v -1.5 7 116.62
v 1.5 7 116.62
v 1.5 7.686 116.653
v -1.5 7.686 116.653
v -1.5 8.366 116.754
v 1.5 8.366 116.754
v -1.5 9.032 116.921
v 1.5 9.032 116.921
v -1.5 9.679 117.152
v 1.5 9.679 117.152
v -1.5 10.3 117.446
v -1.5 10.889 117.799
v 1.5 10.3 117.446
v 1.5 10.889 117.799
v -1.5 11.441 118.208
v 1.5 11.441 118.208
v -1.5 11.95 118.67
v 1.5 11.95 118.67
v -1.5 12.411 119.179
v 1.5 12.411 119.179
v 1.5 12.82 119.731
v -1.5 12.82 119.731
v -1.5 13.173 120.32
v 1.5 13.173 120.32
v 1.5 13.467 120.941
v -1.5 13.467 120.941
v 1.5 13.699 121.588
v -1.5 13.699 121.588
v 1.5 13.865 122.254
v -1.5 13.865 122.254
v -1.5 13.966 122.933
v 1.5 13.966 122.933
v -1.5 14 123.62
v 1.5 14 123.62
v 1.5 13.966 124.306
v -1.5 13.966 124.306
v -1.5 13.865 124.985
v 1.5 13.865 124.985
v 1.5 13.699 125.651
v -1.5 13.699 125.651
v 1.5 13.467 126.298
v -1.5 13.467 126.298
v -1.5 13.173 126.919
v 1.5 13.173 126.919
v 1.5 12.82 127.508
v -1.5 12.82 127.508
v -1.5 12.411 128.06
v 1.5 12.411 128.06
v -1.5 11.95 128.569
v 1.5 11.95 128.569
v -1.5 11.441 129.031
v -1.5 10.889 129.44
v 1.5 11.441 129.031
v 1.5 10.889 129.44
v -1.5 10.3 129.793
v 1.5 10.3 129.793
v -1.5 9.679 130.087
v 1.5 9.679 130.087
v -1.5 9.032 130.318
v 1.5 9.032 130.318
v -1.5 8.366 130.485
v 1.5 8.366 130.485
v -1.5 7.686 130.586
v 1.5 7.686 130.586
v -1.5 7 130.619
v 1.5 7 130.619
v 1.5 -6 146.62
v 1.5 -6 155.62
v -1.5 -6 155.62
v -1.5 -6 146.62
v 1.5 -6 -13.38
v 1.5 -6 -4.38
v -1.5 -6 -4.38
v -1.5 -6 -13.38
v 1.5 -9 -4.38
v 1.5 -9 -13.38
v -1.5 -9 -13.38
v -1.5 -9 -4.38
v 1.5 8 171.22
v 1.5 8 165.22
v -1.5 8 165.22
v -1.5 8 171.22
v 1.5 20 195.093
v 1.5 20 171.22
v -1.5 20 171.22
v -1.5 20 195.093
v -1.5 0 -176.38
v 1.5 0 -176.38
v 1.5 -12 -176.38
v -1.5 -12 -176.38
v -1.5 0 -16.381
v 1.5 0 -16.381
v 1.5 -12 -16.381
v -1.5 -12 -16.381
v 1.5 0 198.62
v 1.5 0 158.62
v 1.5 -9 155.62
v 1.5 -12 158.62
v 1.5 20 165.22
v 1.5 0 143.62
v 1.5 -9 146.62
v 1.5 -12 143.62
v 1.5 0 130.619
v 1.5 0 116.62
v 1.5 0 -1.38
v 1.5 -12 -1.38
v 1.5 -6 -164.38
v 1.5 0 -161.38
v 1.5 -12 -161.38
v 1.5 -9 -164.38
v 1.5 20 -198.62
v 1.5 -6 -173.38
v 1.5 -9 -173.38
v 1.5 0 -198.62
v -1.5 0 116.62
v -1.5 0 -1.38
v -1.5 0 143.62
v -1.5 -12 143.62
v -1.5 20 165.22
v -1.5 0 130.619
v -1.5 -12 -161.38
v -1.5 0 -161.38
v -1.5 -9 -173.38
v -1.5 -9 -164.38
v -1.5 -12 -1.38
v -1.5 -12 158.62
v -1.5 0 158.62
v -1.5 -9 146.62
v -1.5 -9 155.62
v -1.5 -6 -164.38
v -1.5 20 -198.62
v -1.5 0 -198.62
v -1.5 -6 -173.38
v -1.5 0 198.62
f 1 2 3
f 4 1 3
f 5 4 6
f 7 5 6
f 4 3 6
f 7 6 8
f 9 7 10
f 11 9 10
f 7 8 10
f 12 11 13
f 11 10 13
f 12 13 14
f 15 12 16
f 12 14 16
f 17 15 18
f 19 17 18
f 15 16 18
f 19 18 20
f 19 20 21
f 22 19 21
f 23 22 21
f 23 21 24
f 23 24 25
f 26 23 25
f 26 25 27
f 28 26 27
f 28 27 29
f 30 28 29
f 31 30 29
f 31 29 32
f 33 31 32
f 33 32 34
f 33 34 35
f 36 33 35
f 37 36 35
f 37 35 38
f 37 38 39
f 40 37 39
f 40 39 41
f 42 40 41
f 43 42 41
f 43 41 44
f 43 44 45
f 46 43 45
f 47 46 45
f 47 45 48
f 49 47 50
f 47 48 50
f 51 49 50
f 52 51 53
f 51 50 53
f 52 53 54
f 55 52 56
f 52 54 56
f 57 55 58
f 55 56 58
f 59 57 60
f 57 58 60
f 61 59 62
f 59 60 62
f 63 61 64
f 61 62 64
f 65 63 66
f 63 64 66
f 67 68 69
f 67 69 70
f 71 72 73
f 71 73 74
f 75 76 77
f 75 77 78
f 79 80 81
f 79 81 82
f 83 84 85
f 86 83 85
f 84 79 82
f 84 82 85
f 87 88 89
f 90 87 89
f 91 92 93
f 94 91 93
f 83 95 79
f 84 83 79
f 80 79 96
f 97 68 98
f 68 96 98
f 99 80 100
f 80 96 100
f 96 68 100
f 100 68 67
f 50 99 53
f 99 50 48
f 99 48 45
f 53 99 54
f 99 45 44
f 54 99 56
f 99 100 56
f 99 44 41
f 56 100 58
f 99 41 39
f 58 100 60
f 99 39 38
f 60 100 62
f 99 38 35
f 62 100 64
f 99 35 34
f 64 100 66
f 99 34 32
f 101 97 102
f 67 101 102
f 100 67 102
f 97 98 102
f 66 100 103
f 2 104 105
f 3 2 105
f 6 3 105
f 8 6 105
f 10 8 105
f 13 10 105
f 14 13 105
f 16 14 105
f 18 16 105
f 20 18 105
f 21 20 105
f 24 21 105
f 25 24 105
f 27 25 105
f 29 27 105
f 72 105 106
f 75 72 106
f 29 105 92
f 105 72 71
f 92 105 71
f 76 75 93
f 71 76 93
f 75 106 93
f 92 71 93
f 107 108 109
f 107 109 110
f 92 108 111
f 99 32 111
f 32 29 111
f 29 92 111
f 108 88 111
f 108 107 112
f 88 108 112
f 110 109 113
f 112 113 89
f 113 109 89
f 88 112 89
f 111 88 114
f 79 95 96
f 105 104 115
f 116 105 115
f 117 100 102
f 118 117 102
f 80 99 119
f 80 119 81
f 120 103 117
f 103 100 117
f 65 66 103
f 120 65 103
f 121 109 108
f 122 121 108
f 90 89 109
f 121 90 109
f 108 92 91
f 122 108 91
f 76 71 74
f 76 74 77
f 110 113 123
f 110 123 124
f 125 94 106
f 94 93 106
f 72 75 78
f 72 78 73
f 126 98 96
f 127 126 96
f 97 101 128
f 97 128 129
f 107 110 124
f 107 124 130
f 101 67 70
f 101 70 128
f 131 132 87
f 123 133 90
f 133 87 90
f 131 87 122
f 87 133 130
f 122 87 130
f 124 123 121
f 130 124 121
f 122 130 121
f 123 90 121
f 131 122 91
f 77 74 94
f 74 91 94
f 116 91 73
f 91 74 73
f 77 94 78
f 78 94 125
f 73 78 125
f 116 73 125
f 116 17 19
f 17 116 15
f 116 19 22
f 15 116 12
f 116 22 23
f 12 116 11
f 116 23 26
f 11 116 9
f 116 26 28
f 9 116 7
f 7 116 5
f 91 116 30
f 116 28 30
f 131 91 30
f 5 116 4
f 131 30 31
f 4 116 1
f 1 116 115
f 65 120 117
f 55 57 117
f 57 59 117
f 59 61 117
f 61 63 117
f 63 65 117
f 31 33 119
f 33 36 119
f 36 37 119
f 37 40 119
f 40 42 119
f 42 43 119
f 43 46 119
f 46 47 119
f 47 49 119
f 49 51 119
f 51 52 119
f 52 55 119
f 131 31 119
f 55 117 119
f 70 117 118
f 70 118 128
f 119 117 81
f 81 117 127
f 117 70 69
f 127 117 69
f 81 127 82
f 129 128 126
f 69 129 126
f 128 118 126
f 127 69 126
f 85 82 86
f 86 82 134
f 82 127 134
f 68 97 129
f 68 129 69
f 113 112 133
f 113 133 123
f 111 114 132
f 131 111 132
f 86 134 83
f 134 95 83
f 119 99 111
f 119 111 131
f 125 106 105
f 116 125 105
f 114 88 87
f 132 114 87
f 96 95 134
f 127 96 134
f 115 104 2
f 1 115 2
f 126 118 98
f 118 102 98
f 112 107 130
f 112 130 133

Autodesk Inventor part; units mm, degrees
ref_plane "YZ Plane" through (0, 0, 0) normal (1, 0, 0) x (0, 1, 0)
ref_plane "XZ Plane" through (0, 0, 0) normal (0, 1, 0) x (-1, 0, 0)
ref_plane "XY Plane" through (0, 0, 0) normal (0, 0, 1) x (1, 0, 0)
sketch "Sketch2" plane through (0, 0, 0) normal (0, 1, 0) x (-1, 0, 0)
  line L0 (-1.5, -198.6195) -> (1.5, -198.6195)
  line L1 (1.5, -198.6195) -> (1.5, 198.6195)
  line L2 (1.5, 198.6195) -> (-1.5, 198.6195)
  line L3 (-1.5, 198.6195) -> (-1.5, -198.6195)
  line L4 (-1.5, -198.6195) -> (1.5, 198.6195) construction
  line L5 (1.5, -198.6195) -> (-1.5, 198.6195) construction
  point P0 (0, 0)
  dimension "d0" = 3
  dimension "d1" = 397.239
extrude "Extrusion1" add sketch "Sketch2" along normal blind 20
sketch "Sketch3" plane through (1.5, 0, 198.6195) normal (1, 0, 0) x (0, 0, -1)
  line L0 (397.239, 0) -> (0, 0) projected
  line L1 (68, 0) -> (82, 0)
  line L2 (82, 0) -> (82, 7)
  line L3 (68, 7) -> (68, 0)
  arc A0 (82, 7) -> (68, 7) centre (75, 7) ccw
  arc A1 (68, 7) -> (82, 7) centre (75, 7) ccw construction
  line L4 (0, 0) -> (0, 20) projected
  point P0 (198.6195, 0)
  dimension "d4" = 14
  dimension "d5" = 7
  dimension "d6" = 14
  dimension "d9" = 75
extrude "Extrusion2" cut sketch "Sketch3" against normal through all
sketch "Sketch4" plane through (1.5, 0, -198.6195) normal (1, 0, 0) x (0, 0, -1)
  line L0 (-329.239, 0) -> (-397.239, 0) projected
  line L1 (-397.239, 0) -> (-397.239, 20) projected
  line L2 (-397.239, 0) -> (-397.239, 20)
  line L3 (-397.239, 20) -> (-393.7125, 20)
  line L4 (-397.239, 20) -> (0, 20) projected
  line L5 (-397.239, 0) -> (-393.7125, 20)
  point P0 (-198.6195, 0)
  dimension "d10" = 10
extrude "Extrusion3" cut sketch "Sketch4" against normal through all
sketch "Sketch6" plane through (1.5, 0, -198.6195) normal (1, 0, 0) x (0, 0, -1)
  line L0 (-393.7125, 20) -> (0, 20) projected
  line L1 (-369.839, 20) -> (-363.839, 20)
  line L2 (-363.839, 20) -> (-363.839, 8)
  line L3 (-363.839, 8) -> (-369.839, 8)
  line L4 (-369.839, 8) -> (-369.839, 20)
  line L5 (-329.239, 0) -> (-397.239, 0) construction
  line L6 (-397.239, 0) -> (-397.239, 30) construction
  point P0 (-198.6195, 0)
  dimension "d20" = 6
  dimension "d21" = 12
  dimension "d25" = 27.4
extrude "Extrusion5" cut sketch "Sketch6" against normal blind 6
sketch "Sketch7" plane through (1.5, 0, -198.6195) normal (1, 0, 0) x (0, 0, -1)
  line L0 (-357.239, 0) -> (-342.239, 0)
  line L1 (-342.239, 0) -> (-342.239, -12)
  line L2 (-342.239, -12) -> (-357.239, -12)
  line L3 (-357.239, -12) -> (-357.239, 0)
  line L4 (-354.239, -6) -> (-345.239, -6)
  line L5 (-345.239, -6) -> (-345.239, -9)
  line L6 (-345.239, -9) -> (-354.239, -9)
  line L7 (-354.239, -9) -> (-354.239, -6)
  line L8 (-397.239, 0) -> (-329.239, 0) projected
  line L9 (-197.239, 0) -> (-182.239, 0)
  line L10 (-182.239, 0) -> (-182.239, -12)
  line L11 (-182.239, -12) -> (-197.239, -12)
  line L12 (-197.239, -12) -> (-197.239, 0)
  line L13 (-194.239, -6) -> (-185.239, -6)
  line L14 (-185.239, -6) -> (-185.239, -9)
  line L15 (-185.239, -9) -> (-194.239, -9)
  line L16 (-194.239, -9) -> (-194.239, -6)
  line L17 (-37.239, 0) -> (-22.239, 0)
  line L18 (-22.239, 0) -> (-22.239, -12)
  line L19 (-22.239, -12) -> (-37.239, -12)
  line L20 (-37.239, -12) -> (-37.239, 0)
  line L21 (-34.239, -6) -> (-25.239, -6)
  line L22 (-25.239, -6) -> (-25.239, -9)
  line L23 (-25.239, -9) -> (-34.239, -9)
  line L24 (-34.239, -9) -> (-34.239, -6)
  line L25 (-315.239, 0) -> (0, 0) projected
  point P0 (-198.6195, 0)
  dimension "d26" = 15
  dimension "d27" = 3
  dimension "d28" = 6
  dimension "d29" = 3
  dimension "d30" = 3
  dimension "d31" = 3
  dimension "d32" = 40
  dimension "d33" = 15
  dimension "d34" = 3
  dimension "d35" = 6
  dimension "d36" = 3
  dimension "d37" = 3
  dimension "d38" = 3
  dimension "d39" = 15
  dimension "d40" = 3
  dimension "d41" = 6
  dimension "d42" = 3
  dimension "d43" = 3
  dimension "d44" = 3
  dimension "d45" = 145
  dimension "d46" = 145
extrude "Extrusion6" add sketch "Sketch7" against normal blind 3
equation "\"d30\" = d29"
equation "\"d31\" = d29"
equation "\"d37\" = d36"
equation "\"d38\" = d36"
equation "\"d43\" = d42"
equation "\"d44\" = d42"
properties part number "wall-inner-plunger"
